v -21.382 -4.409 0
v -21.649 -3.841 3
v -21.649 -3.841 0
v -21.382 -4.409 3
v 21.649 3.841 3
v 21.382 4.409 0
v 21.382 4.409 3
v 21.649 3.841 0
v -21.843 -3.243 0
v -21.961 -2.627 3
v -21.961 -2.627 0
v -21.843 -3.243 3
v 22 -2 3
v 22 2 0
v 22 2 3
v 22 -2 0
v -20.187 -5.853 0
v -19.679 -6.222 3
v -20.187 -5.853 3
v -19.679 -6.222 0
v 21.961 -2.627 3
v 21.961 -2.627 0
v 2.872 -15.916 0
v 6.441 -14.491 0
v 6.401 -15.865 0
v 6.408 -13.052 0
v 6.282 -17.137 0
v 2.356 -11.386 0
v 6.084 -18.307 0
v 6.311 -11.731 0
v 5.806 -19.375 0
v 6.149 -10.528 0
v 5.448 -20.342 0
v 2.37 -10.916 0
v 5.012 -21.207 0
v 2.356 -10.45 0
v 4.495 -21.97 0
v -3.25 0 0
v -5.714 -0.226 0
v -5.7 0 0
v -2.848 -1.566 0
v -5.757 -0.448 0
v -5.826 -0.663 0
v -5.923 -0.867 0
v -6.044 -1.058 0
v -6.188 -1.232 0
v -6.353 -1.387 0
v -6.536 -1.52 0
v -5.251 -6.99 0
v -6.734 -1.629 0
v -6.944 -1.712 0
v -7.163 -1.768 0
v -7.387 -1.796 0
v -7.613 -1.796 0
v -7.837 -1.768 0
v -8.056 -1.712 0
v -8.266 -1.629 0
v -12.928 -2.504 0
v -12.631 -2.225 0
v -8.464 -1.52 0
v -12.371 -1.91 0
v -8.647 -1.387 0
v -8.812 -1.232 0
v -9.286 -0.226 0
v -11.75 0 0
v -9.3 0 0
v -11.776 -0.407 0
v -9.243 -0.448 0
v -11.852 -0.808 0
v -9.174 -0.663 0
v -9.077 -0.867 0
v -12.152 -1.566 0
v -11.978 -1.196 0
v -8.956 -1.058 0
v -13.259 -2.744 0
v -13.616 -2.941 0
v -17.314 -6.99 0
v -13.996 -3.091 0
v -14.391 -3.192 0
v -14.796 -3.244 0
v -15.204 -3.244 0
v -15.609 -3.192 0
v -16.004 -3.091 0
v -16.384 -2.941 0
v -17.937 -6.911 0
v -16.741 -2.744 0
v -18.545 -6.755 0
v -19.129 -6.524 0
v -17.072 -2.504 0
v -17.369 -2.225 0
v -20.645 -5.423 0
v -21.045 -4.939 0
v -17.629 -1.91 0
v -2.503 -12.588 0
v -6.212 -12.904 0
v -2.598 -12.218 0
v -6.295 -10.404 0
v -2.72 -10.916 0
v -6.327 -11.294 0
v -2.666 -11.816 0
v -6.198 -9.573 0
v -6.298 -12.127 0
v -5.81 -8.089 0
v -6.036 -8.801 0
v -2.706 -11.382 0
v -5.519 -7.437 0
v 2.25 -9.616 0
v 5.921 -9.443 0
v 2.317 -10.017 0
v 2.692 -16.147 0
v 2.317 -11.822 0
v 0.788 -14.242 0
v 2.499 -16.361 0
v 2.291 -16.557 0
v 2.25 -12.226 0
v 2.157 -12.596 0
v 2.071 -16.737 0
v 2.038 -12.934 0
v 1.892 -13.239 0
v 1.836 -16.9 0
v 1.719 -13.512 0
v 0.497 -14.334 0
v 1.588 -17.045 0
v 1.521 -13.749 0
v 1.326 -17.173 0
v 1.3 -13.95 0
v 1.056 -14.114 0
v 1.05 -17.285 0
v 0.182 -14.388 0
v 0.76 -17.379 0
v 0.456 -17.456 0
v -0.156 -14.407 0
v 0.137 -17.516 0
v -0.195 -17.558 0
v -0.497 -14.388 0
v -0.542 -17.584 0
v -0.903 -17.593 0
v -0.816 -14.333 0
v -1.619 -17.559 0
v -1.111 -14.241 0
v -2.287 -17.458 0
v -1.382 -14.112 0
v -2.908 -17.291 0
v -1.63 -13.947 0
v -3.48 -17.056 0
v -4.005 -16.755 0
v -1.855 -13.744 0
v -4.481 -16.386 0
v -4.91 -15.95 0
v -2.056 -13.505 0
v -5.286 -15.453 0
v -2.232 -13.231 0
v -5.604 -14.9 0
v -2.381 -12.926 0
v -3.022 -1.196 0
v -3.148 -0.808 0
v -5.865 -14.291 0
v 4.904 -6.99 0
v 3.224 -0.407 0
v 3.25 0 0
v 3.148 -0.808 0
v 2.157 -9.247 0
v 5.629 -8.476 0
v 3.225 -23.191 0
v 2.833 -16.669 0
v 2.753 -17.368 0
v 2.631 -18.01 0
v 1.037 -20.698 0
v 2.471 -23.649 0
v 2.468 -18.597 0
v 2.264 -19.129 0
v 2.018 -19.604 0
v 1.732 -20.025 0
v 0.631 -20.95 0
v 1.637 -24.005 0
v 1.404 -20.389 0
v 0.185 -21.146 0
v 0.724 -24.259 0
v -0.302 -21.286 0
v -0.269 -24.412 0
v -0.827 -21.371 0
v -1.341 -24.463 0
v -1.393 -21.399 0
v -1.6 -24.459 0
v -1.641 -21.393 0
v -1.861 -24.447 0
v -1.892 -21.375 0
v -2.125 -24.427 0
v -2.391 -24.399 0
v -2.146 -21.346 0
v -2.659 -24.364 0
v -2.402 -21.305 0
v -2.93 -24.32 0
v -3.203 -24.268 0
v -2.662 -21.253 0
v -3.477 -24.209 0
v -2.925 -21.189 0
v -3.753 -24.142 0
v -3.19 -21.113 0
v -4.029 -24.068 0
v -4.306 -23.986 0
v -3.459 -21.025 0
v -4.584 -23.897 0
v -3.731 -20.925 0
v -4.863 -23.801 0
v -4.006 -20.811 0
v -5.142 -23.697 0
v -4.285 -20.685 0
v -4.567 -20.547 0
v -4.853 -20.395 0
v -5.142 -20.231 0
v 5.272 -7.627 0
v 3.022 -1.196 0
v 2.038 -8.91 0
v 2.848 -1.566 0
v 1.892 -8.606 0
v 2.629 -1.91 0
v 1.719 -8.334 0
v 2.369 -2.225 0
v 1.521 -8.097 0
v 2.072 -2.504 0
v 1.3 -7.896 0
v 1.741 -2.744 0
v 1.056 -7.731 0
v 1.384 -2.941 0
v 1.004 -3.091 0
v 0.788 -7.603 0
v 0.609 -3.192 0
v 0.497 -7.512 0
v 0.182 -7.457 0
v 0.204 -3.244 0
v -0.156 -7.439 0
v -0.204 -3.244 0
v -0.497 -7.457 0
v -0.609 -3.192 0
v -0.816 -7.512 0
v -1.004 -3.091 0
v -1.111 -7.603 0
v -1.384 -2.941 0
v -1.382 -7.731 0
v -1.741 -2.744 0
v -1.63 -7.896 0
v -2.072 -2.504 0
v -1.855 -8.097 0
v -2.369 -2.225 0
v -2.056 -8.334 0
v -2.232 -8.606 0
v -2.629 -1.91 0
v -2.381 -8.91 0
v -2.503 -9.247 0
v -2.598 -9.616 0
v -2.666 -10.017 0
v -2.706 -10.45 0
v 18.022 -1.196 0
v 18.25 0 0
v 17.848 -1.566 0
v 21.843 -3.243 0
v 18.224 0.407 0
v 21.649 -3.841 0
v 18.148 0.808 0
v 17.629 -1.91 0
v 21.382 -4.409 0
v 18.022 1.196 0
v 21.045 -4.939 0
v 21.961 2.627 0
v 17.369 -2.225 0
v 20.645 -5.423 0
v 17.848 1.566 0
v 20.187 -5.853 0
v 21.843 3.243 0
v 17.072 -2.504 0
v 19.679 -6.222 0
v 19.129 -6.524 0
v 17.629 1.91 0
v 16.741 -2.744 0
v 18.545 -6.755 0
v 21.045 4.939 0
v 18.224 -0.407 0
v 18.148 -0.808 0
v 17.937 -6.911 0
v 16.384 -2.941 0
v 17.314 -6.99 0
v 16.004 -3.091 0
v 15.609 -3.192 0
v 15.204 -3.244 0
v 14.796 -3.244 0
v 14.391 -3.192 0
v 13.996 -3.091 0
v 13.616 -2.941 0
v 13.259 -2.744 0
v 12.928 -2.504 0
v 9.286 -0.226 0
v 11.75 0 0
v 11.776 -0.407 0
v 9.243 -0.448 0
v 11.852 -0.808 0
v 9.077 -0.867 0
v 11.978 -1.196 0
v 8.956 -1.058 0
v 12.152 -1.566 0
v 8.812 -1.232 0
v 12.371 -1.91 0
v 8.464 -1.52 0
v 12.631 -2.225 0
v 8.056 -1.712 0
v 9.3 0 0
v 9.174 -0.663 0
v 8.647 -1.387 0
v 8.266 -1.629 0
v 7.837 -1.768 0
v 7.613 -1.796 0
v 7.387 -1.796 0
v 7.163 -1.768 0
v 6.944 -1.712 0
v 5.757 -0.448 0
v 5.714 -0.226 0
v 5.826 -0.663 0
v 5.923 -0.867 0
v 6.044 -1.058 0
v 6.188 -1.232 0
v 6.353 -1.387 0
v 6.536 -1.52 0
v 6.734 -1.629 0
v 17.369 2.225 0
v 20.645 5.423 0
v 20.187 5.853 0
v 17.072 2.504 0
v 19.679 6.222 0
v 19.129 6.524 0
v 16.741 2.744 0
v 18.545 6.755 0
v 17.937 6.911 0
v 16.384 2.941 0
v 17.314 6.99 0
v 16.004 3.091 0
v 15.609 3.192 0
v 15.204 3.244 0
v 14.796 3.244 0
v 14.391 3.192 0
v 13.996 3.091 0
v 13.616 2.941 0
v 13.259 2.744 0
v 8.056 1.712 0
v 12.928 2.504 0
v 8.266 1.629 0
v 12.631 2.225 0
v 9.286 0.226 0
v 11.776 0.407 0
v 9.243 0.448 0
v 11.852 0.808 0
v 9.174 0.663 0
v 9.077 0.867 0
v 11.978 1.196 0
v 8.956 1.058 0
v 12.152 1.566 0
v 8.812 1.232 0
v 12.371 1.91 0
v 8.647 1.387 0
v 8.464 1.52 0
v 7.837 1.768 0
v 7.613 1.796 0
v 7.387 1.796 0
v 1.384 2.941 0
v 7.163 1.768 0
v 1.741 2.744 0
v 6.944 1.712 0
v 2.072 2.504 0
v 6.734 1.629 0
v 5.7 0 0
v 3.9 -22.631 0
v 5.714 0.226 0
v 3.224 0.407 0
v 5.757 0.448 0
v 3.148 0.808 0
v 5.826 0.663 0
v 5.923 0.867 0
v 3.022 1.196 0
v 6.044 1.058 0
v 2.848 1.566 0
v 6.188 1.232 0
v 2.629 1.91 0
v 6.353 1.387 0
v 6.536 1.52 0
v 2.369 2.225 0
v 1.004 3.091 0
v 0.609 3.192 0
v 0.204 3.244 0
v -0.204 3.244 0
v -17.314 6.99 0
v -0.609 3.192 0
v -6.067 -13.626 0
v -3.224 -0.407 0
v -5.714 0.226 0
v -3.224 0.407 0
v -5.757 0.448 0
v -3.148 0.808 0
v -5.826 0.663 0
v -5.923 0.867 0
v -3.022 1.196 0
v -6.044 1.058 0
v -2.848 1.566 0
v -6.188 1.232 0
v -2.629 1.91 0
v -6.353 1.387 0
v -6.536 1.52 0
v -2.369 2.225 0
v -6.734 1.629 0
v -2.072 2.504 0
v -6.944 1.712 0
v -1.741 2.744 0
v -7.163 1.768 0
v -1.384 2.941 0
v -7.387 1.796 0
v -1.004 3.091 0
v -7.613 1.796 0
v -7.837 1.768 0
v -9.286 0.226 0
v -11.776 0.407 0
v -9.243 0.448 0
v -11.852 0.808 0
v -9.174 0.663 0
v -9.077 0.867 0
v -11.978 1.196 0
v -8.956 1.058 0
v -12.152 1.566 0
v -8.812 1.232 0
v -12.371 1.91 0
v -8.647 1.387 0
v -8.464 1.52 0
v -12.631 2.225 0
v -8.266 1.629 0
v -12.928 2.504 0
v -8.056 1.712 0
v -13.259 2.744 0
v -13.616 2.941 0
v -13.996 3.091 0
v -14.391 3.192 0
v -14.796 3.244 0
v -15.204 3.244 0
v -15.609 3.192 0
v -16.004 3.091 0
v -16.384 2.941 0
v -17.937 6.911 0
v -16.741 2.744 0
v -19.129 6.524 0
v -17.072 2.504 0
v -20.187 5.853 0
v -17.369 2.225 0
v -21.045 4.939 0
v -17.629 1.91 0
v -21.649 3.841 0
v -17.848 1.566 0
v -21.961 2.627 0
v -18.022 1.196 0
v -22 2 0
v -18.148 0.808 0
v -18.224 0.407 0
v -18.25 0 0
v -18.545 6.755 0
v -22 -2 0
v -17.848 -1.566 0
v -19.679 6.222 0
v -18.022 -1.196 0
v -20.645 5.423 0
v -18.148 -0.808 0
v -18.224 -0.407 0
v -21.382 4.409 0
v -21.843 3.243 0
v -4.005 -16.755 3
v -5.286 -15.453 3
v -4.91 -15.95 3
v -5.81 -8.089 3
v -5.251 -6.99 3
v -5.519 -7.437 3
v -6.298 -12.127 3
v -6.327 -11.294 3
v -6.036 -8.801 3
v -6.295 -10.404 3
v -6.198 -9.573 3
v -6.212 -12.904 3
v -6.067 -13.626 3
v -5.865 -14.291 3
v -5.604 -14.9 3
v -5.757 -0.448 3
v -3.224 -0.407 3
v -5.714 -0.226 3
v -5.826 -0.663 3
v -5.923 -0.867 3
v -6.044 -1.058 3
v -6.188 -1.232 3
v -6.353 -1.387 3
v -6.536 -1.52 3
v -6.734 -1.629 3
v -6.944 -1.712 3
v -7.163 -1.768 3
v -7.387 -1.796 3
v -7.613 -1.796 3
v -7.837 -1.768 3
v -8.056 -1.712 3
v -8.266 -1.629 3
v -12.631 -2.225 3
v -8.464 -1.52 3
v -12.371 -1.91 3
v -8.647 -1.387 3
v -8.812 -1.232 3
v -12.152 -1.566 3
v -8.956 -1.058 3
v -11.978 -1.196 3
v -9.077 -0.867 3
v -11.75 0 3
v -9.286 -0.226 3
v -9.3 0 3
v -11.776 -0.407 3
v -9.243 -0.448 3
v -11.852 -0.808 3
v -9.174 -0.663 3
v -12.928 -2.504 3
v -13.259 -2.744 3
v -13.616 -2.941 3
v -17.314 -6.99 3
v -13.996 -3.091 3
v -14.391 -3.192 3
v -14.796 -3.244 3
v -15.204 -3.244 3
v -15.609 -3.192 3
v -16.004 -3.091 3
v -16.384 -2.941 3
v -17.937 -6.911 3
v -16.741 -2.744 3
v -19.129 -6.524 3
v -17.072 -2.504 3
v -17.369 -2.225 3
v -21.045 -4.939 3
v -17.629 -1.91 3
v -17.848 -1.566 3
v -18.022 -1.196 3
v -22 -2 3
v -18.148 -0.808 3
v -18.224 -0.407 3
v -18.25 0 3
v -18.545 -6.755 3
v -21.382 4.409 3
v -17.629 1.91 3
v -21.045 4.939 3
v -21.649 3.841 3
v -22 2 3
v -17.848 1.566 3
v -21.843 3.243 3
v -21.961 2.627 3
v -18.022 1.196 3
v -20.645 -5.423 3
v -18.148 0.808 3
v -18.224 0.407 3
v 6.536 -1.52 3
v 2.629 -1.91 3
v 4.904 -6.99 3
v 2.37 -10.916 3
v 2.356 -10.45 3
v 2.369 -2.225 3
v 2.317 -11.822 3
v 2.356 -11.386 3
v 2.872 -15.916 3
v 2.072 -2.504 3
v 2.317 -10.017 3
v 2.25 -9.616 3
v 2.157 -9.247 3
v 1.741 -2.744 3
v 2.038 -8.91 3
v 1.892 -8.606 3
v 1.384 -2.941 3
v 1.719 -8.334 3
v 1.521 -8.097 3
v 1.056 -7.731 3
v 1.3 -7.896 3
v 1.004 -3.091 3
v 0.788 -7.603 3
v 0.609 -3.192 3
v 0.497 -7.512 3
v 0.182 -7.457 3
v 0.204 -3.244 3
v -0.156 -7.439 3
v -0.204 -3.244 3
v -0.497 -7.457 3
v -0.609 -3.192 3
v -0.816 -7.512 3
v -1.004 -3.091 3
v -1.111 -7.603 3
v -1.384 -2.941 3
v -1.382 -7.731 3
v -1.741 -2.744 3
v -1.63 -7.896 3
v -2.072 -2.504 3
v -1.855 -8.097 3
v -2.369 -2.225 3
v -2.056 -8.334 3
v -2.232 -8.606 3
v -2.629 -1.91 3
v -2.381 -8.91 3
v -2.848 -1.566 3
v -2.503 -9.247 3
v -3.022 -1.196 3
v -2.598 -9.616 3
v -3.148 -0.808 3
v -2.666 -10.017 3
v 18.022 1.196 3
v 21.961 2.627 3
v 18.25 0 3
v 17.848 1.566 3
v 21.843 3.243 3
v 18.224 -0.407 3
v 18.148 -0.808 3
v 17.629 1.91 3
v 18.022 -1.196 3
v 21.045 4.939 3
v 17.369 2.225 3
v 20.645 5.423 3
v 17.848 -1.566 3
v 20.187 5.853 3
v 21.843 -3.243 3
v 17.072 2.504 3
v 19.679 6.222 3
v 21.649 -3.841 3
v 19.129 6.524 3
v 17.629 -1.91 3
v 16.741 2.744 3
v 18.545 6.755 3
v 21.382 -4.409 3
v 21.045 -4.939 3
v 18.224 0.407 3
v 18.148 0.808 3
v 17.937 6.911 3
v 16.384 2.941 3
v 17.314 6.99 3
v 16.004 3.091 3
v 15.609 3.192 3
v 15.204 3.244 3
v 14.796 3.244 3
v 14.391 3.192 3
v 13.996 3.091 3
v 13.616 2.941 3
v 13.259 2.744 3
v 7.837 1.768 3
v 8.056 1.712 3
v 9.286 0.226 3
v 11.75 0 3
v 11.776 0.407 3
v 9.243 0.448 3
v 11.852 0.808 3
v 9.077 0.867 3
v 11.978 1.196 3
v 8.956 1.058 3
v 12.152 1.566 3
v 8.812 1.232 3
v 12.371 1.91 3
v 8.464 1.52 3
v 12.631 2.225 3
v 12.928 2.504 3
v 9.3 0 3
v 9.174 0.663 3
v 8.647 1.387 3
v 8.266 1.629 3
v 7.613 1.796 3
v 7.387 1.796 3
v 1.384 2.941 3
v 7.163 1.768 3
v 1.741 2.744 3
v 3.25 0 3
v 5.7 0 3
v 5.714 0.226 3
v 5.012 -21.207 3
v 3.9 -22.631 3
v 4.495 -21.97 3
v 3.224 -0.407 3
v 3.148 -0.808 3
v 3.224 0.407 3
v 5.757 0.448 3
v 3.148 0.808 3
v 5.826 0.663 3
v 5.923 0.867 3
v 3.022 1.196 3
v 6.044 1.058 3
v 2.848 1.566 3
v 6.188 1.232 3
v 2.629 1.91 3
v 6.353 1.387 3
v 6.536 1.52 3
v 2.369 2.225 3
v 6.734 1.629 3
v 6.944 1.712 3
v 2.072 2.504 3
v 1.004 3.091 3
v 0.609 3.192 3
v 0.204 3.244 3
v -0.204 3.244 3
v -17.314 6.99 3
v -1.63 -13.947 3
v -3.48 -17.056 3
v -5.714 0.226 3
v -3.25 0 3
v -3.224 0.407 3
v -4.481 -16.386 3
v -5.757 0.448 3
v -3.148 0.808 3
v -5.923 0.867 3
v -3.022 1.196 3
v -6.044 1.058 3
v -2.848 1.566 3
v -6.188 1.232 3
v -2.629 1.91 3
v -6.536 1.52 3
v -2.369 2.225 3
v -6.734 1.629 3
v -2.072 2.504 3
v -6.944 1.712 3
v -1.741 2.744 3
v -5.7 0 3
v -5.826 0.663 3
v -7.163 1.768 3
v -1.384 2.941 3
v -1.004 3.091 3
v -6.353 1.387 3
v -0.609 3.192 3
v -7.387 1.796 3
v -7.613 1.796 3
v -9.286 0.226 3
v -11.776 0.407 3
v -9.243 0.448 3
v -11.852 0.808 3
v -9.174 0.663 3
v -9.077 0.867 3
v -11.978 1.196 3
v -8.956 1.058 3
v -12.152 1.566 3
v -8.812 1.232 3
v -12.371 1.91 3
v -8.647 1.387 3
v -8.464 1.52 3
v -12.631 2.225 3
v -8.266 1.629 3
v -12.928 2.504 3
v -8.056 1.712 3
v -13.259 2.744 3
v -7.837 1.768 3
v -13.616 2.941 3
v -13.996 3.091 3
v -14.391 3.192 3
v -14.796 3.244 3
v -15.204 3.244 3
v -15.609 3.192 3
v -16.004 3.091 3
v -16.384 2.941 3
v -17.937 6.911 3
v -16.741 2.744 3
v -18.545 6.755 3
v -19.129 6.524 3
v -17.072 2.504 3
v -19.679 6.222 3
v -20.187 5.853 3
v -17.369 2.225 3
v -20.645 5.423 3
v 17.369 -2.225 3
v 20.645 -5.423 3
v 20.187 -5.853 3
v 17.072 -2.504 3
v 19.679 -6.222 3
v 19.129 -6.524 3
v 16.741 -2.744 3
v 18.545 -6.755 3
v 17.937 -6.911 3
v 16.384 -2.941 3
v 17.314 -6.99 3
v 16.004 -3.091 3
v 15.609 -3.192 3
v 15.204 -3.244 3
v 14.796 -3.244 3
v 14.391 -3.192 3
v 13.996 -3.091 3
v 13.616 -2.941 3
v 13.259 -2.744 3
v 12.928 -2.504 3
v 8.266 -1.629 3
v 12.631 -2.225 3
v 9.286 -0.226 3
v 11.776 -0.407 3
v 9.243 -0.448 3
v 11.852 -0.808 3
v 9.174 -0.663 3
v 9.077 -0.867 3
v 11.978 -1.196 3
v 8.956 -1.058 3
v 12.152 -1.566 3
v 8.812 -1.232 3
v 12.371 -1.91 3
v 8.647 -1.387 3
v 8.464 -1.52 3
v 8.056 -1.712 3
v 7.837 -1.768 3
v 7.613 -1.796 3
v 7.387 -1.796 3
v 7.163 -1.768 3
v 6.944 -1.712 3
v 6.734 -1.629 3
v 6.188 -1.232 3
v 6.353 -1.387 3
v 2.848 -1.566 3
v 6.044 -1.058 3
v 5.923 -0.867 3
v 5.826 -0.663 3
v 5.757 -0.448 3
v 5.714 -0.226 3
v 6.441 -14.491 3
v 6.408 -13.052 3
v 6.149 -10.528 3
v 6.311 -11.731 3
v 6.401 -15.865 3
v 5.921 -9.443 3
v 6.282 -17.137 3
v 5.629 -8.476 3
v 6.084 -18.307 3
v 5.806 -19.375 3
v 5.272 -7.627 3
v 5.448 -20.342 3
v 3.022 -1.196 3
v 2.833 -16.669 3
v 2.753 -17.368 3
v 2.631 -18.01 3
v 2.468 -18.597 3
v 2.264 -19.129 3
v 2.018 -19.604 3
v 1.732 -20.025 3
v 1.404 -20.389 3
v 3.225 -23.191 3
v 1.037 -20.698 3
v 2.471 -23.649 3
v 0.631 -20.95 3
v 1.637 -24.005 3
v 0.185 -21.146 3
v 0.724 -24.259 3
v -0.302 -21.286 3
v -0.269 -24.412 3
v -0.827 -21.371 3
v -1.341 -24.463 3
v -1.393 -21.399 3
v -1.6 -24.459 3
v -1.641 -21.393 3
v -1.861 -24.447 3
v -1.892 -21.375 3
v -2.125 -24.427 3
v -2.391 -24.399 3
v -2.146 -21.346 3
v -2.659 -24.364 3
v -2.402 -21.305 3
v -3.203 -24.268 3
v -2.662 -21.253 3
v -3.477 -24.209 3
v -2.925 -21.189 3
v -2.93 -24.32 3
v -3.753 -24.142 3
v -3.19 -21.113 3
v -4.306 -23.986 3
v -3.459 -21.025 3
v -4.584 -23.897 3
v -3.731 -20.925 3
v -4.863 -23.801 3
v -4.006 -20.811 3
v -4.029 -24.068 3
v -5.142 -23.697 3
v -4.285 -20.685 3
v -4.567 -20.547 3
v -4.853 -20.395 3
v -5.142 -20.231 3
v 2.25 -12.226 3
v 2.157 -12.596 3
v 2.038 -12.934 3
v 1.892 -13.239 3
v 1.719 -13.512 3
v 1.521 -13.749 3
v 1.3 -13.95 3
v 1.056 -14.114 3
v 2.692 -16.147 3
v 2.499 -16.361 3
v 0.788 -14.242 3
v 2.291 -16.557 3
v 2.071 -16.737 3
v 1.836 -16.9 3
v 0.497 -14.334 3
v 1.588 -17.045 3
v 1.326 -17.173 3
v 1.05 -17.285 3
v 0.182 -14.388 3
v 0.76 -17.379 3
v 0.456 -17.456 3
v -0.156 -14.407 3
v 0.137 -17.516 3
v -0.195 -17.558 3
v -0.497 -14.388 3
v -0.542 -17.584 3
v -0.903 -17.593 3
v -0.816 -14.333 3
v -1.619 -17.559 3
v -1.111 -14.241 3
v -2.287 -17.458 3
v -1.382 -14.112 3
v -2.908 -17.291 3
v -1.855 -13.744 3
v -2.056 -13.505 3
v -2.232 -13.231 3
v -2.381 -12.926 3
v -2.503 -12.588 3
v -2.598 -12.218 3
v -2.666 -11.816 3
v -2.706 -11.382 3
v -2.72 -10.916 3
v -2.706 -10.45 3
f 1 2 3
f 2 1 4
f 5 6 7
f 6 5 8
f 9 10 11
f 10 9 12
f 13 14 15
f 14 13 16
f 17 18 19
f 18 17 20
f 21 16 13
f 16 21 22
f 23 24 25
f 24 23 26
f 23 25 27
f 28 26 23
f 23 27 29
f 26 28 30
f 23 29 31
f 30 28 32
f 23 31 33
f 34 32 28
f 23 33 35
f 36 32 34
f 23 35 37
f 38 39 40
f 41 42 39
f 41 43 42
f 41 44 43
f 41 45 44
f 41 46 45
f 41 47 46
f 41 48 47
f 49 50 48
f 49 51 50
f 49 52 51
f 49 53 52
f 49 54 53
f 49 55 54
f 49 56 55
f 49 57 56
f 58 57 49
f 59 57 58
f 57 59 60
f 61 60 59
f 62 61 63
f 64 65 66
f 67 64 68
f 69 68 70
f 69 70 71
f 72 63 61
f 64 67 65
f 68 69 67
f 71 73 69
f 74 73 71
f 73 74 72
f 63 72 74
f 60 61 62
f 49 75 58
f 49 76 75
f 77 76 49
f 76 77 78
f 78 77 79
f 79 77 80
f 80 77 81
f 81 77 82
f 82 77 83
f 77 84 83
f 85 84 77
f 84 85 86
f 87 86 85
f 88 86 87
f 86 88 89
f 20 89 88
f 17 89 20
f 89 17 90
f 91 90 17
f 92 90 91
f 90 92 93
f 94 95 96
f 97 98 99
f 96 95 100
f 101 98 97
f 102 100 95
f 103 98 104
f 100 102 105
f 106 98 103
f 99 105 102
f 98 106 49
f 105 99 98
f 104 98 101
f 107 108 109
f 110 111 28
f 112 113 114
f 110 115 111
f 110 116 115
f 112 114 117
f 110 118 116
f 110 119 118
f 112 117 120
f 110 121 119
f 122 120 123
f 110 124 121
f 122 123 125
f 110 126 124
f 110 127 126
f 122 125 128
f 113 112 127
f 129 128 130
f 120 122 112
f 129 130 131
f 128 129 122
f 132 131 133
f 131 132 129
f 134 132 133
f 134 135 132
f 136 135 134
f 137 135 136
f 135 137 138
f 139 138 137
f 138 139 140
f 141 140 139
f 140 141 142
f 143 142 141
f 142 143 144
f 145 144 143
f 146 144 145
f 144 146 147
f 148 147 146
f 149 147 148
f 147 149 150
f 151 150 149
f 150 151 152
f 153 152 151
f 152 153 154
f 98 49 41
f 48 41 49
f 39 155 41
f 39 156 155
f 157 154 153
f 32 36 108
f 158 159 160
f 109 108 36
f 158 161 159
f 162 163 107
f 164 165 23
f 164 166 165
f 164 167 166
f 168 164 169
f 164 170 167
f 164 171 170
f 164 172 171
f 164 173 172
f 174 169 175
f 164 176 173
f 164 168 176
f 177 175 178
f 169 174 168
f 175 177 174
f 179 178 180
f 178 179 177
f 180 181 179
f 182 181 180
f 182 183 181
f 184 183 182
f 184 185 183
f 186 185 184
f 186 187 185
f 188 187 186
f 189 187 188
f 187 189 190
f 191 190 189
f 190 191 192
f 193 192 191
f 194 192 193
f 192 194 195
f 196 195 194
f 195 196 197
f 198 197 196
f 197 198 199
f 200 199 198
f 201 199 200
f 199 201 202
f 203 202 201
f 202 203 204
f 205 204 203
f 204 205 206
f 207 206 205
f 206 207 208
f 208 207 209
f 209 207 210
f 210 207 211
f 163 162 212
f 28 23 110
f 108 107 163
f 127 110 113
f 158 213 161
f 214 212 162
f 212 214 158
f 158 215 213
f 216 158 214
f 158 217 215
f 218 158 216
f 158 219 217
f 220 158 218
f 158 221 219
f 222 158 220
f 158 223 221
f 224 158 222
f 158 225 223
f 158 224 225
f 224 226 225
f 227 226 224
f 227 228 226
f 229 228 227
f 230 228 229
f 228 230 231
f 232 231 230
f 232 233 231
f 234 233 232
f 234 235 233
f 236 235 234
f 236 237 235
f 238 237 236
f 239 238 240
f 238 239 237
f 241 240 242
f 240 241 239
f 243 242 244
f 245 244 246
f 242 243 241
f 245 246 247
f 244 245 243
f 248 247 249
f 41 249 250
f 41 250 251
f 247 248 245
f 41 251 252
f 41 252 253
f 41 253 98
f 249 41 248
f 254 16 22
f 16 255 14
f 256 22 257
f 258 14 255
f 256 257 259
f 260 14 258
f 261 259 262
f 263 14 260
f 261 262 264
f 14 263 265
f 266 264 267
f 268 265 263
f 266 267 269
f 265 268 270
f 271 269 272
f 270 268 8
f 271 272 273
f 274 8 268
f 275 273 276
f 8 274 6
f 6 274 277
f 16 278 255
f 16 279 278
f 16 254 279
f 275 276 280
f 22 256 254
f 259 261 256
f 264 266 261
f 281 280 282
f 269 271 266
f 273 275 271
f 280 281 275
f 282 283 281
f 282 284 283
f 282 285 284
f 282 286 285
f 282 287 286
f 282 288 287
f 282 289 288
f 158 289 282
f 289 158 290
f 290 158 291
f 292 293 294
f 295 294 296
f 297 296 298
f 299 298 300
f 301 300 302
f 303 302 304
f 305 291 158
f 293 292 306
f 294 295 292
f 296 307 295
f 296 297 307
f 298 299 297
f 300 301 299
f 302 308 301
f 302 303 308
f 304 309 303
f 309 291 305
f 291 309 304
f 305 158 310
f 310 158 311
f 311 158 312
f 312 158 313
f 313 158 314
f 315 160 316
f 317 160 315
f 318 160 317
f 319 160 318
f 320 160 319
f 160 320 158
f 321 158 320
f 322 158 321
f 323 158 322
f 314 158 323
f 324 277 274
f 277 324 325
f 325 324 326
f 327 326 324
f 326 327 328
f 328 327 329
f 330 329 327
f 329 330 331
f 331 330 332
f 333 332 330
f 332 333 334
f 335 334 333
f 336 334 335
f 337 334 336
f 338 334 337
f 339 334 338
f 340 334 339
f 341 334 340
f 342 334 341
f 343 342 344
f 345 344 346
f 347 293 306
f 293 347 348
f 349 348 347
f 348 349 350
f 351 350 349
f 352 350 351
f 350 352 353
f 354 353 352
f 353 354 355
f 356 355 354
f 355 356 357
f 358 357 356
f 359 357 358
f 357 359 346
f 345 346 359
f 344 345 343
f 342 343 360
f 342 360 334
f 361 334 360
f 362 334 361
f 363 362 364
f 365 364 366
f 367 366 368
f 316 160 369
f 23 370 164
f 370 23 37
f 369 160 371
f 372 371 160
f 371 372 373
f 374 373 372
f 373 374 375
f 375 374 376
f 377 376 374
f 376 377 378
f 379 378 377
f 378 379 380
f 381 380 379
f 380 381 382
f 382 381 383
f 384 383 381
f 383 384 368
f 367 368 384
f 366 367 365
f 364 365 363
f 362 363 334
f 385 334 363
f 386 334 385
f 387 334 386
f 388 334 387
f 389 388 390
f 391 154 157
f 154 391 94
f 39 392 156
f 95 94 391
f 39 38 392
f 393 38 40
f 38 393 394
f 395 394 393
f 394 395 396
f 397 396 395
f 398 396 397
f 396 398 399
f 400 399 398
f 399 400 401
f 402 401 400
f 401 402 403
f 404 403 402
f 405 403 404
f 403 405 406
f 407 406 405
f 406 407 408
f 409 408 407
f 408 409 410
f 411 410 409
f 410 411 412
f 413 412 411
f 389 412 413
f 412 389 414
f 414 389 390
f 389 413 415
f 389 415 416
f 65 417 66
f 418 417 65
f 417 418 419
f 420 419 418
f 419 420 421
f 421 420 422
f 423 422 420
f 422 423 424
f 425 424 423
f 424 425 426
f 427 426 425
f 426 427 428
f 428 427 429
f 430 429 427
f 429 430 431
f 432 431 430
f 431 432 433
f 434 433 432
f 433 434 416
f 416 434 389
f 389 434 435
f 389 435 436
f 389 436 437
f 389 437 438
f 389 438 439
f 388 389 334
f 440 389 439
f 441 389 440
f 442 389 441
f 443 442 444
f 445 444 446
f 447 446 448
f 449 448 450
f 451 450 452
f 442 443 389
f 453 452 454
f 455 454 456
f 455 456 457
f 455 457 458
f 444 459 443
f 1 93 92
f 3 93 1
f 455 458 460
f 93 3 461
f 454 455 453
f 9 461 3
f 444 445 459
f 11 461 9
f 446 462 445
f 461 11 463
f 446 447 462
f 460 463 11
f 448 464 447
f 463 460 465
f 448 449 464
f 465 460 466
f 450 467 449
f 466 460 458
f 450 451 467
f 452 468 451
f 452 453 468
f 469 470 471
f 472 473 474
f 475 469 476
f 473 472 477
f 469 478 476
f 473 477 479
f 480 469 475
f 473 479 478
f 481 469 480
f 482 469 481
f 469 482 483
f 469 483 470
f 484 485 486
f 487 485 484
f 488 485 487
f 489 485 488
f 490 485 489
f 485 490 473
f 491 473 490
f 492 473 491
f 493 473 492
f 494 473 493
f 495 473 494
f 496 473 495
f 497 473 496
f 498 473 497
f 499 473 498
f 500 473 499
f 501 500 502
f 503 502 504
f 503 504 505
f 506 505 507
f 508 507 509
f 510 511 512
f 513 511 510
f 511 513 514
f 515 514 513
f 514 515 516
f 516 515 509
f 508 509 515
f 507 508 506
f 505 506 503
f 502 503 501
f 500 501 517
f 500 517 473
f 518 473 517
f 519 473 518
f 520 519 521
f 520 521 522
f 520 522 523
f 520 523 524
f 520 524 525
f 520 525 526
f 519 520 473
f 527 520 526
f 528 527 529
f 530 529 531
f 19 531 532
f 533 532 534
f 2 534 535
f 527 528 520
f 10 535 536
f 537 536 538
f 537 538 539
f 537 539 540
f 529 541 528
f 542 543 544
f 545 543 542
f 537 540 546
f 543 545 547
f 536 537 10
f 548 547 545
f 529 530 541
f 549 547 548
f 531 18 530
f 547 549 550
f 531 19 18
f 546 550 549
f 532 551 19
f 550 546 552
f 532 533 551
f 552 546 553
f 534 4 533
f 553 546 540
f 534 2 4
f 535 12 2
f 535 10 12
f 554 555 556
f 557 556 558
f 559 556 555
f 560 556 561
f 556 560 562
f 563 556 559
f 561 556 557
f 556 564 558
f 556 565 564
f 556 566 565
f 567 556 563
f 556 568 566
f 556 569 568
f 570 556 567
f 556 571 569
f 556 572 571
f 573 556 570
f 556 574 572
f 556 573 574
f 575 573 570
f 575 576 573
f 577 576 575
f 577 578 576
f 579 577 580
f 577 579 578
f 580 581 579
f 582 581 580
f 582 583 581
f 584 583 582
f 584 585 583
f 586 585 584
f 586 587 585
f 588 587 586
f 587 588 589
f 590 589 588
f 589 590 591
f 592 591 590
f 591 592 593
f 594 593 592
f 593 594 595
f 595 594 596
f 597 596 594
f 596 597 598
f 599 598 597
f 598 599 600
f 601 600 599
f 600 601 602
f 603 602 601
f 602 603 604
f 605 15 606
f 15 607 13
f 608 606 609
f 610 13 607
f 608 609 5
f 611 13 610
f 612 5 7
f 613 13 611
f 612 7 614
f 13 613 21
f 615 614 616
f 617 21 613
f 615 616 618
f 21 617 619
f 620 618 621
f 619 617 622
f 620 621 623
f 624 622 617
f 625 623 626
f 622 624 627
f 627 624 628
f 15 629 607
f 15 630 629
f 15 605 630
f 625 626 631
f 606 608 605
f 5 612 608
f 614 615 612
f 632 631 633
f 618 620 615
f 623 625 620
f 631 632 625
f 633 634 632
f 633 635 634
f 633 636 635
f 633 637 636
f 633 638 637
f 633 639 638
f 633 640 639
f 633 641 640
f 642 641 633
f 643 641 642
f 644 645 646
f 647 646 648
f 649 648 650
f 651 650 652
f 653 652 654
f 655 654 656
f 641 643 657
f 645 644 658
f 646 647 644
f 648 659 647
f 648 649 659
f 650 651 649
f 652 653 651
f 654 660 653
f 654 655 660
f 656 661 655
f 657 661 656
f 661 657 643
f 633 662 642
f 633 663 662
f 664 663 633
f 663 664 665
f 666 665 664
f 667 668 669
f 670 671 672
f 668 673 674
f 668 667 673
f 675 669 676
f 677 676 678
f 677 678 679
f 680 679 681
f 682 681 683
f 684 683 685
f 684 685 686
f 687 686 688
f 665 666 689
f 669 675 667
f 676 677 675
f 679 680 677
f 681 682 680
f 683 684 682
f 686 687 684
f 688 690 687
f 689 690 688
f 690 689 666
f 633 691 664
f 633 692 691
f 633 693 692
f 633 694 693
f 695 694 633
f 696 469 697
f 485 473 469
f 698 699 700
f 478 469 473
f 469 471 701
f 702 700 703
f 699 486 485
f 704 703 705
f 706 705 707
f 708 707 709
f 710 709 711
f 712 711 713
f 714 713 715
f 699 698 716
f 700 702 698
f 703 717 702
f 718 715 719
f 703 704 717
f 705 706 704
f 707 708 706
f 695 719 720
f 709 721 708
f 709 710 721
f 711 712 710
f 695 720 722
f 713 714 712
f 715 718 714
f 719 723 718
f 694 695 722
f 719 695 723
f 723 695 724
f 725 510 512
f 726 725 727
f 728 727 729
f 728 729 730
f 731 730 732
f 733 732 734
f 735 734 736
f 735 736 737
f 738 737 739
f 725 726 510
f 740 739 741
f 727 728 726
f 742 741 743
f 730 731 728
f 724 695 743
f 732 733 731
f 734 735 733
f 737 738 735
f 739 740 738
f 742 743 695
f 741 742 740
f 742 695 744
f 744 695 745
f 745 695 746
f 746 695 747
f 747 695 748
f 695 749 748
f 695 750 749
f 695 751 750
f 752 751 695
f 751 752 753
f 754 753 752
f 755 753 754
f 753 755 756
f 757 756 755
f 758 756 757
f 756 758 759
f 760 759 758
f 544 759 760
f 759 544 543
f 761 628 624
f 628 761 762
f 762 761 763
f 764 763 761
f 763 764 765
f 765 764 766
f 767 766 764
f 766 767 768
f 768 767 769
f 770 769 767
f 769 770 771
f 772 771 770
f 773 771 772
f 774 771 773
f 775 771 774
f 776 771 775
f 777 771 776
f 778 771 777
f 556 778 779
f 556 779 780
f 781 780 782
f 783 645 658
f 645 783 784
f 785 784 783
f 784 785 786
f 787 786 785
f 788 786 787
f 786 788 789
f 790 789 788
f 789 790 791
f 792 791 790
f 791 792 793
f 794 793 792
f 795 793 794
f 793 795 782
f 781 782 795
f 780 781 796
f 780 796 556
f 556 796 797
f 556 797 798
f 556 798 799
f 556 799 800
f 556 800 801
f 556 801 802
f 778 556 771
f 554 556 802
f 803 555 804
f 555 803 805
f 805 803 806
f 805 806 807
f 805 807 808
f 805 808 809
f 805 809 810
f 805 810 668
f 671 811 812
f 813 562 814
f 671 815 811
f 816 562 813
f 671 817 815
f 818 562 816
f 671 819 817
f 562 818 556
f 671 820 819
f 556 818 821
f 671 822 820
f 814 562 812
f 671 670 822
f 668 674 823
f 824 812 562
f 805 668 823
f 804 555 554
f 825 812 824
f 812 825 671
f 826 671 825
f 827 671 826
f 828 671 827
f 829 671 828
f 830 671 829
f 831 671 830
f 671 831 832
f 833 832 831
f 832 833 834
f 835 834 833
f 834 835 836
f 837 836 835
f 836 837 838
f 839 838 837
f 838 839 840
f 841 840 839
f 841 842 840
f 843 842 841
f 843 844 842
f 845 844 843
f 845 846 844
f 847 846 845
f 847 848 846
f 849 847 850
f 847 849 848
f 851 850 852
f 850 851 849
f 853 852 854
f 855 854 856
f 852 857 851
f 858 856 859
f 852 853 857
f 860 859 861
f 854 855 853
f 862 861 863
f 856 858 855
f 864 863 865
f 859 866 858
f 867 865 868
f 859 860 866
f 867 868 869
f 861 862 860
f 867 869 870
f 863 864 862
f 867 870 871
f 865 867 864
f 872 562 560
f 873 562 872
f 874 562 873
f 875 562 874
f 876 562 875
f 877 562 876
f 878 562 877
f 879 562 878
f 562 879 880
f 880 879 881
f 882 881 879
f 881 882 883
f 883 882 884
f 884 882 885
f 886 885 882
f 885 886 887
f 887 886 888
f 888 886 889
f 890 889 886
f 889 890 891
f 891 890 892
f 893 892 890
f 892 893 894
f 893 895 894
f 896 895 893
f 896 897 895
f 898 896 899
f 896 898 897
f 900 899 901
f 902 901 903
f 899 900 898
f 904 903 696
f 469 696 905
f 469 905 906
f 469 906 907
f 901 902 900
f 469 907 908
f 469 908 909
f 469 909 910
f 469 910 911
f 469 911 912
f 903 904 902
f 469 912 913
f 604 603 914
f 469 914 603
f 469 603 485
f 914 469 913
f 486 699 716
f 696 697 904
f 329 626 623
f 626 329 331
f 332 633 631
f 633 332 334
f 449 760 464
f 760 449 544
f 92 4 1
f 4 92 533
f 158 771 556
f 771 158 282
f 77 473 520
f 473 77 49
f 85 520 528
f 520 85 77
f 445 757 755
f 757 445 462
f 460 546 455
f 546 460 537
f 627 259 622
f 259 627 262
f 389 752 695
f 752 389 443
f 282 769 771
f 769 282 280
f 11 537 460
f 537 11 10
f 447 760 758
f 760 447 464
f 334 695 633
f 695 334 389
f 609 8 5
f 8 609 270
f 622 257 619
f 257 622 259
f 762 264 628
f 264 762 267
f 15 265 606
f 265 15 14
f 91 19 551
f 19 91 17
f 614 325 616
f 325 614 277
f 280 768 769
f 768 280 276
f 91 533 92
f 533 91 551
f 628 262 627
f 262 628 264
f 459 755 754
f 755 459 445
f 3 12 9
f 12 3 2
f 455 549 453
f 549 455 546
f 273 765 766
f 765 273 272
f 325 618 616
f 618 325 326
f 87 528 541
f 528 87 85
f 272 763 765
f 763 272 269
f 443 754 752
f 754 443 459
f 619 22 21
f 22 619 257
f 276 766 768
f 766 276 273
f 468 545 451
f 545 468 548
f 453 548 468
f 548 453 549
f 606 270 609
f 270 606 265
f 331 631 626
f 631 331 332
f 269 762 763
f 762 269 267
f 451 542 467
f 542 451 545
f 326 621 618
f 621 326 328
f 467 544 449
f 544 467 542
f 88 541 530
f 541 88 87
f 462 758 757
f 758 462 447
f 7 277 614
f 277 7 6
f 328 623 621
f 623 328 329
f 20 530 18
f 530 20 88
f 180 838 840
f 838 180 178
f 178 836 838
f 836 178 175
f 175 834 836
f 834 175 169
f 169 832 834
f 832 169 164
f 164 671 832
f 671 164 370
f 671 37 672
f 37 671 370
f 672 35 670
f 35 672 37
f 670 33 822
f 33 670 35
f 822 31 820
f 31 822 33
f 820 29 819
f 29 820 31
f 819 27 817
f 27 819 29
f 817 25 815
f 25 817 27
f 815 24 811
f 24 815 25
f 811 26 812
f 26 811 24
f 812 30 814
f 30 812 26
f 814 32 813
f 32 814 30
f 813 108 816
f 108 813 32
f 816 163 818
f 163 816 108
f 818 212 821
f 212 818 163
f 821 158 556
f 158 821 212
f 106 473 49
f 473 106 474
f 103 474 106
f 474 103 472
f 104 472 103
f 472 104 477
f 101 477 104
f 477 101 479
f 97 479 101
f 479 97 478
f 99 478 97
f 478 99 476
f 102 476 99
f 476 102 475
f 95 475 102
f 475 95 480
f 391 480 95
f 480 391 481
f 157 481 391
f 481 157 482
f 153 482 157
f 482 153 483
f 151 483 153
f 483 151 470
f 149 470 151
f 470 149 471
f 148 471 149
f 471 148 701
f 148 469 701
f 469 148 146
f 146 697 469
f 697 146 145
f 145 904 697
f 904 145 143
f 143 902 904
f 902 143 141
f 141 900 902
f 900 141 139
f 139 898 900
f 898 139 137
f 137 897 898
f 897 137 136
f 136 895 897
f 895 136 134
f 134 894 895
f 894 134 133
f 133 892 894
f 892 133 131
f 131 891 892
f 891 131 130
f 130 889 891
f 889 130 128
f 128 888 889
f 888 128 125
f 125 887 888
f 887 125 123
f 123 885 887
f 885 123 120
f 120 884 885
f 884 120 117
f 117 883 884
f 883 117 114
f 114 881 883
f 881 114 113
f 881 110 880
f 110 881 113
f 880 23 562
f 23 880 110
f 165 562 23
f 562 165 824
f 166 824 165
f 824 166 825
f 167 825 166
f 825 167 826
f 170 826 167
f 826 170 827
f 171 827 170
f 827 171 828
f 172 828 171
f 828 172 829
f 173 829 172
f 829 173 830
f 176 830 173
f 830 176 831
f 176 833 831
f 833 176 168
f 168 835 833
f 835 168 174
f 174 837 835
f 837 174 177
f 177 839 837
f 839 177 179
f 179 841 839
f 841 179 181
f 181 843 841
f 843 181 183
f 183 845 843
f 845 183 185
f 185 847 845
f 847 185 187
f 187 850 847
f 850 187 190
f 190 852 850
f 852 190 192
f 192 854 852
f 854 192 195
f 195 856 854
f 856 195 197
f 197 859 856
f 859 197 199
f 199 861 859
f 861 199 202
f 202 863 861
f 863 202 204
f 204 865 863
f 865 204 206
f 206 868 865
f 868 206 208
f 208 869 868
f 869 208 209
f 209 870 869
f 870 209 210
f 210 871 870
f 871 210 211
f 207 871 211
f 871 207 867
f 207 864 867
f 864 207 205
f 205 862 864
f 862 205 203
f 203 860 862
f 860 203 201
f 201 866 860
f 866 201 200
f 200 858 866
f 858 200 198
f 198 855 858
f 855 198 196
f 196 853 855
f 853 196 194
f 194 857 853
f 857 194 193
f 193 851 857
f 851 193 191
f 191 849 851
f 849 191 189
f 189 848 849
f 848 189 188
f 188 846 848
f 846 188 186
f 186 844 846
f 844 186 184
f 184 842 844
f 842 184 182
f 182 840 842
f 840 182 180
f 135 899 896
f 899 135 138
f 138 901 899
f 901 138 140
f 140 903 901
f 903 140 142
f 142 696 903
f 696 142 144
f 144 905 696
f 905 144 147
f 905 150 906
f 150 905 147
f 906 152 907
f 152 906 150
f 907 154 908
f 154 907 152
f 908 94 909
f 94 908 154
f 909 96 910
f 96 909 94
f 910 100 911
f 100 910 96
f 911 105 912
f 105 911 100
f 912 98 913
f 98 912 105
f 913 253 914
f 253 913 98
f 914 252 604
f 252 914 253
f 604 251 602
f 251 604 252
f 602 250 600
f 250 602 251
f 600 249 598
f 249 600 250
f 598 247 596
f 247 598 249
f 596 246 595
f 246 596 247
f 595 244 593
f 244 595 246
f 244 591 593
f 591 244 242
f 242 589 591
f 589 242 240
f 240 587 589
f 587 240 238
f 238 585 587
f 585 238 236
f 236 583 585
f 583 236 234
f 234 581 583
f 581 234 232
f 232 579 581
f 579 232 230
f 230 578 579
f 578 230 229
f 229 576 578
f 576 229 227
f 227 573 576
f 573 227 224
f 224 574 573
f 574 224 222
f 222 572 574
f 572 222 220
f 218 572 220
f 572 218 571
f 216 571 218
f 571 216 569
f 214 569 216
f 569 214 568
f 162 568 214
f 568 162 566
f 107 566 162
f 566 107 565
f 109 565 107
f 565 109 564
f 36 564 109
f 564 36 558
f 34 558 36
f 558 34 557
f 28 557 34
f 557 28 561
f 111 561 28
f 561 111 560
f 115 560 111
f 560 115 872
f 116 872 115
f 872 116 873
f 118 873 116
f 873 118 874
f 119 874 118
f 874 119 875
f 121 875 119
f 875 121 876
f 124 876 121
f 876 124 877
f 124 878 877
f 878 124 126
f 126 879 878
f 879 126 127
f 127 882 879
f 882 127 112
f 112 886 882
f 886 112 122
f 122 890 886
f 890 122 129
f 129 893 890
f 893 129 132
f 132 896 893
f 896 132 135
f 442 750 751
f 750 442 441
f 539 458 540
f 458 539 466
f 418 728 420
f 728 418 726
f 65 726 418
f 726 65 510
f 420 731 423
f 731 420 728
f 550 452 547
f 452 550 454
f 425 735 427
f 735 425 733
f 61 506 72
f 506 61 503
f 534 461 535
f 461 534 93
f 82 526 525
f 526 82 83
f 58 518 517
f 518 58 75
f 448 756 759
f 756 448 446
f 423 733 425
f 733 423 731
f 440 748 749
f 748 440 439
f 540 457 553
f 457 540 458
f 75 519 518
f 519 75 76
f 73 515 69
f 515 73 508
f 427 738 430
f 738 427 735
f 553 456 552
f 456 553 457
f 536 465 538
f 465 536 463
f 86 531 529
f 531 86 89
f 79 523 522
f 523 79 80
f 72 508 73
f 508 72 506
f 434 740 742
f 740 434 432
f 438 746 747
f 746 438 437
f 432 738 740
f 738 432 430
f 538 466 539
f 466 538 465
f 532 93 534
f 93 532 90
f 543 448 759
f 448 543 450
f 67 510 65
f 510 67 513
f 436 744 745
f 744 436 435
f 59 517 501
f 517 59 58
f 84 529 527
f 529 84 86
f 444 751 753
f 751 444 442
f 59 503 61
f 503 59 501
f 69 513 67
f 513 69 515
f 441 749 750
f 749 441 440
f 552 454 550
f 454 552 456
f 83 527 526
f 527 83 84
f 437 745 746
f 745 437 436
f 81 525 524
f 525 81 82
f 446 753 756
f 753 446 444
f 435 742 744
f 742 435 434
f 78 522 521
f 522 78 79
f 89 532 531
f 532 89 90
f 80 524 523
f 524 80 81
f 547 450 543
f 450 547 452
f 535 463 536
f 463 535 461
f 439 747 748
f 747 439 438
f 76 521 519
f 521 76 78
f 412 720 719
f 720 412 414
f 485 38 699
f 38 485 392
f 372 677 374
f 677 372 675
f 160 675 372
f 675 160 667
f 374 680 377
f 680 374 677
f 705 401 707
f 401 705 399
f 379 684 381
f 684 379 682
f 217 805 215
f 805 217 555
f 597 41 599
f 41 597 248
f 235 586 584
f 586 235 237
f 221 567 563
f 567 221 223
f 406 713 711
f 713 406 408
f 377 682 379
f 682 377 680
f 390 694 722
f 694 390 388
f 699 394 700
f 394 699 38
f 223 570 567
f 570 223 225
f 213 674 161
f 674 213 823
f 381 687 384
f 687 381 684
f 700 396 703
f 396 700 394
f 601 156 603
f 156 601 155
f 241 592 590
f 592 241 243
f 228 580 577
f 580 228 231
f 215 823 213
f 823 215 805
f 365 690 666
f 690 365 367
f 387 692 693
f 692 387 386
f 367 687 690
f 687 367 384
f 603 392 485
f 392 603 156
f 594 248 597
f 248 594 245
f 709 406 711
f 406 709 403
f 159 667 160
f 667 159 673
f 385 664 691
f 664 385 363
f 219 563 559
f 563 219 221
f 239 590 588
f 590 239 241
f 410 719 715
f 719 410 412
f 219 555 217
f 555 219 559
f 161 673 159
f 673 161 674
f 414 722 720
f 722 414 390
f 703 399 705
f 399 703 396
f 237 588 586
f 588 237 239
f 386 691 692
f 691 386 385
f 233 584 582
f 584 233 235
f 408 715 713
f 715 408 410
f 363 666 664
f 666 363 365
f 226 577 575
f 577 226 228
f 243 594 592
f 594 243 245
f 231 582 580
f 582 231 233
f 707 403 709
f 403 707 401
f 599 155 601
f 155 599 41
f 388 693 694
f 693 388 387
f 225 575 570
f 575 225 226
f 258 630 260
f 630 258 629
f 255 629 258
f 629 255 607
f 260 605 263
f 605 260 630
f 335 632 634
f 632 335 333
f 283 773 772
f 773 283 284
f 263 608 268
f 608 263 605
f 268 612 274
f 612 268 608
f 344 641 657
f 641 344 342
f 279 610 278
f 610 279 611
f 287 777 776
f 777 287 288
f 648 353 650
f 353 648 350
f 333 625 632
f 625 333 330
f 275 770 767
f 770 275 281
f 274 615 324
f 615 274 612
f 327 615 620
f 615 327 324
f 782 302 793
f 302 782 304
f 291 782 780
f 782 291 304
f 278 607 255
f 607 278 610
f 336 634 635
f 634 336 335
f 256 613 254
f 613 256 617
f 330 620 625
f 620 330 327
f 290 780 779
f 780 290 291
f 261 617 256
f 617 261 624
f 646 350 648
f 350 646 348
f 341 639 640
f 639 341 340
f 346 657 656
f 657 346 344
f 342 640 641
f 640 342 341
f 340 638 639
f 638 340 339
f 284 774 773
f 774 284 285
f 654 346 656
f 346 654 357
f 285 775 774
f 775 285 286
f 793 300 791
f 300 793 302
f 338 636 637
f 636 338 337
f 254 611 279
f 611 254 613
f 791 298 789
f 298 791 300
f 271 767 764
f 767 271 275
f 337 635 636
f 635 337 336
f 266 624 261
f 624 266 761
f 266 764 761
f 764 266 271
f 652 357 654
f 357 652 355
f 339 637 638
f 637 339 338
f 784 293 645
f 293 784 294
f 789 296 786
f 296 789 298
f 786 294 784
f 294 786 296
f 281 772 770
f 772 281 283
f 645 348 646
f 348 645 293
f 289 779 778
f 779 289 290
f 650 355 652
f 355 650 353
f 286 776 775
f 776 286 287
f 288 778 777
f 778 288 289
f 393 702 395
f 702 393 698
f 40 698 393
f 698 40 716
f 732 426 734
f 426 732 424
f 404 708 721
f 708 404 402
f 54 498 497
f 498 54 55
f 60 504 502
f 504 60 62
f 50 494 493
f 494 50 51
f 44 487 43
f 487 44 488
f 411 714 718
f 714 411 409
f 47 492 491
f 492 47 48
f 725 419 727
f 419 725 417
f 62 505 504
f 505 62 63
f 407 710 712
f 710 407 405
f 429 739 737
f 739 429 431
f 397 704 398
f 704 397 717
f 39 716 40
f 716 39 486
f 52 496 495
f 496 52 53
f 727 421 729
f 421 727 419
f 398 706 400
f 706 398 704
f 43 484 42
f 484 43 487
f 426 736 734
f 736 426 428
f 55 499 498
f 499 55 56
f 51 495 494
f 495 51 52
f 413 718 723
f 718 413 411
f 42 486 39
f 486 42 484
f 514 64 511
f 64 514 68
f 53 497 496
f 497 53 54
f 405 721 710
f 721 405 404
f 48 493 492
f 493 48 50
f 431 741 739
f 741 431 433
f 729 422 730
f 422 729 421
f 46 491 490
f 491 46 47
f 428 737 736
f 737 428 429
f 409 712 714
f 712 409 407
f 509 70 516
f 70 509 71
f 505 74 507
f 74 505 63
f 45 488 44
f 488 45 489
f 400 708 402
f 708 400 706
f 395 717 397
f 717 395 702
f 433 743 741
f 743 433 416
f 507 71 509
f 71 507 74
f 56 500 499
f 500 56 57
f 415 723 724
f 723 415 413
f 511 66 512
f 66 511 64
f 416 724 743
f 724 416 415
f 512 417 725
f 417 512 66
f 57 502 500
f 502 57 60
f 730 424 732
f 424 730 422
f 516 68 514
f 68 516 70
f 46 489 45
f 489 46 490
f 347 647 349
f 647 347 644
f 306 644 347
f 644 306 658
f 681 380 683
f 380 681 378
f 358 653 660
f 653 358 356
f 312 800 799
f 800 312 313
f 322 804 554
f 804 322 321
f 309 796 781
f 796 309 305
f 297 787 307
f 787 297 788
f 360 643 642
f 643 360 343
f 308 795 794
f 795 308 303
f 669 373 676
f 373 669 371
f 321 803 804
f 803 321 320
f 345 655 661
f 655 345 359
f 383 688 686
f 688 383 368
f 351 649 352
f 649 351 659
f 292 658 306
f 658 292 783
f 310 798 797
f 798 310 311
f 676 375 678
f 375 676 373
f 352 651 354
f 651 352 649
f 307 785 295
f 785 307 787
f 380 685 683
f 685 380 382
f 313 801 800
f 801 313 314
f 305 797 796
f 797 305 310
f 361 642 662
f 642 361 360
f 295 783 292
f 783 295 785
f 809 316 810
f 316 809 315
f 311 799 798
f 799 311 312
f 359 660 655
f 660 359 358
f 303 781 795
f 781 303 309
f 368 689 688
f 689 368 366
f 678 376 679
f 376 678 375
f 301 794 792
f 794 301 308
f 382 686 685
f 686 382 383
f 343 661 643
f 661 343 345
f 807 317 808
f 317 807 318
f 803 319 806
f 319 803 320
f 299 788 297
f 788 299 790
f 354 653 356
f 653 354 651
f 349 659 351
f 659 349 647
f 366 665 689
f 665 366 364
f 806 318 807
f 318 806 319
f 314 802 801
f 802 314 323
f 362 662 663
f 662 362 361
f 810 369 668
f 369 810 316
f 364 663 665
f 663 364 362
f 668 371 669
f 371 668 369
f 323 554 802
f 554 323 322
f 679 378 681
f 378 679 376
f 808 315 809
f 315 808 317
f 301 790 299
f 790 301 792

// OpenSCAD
$fn = 50;


difference() {
	union() {
		hull() {
			translate(v = [-17.0000000000, 2.0000000000, 0]) {
				cylinder(h = 3, r = 5);
			}
			translate(v = [17.0000000000, 2.0000000000, 0]) {
				cylinder(h = 3, r = 5);
			}
			translate(v = [-17.0000000000, -2.0000000000, 0]) {
				cylinder(h = 3, r = 5);
			}
			translate(v = [17.0000000000, -2.0000000000, 0]) {
				cylinder(h = 3, r = 5);
			}
		}
		translate(v = [0, -5, 0]) {
			linear_extrude(height = 3) {
				text(font = "DejaVu Sans Mono:style=Bold", halign = "center", size = 19.0000000000, text = "9", valign = "top");
			}
		}
	}
	union() {
		translate(v = [-15.0000000000, 0.0000000000, 0]) {
			translate(v = [0, 0, -100]) {
				cylinder(h = 200, r = 3.2500000000);
			}
		}
		translate(v = [0, 0, -100]) {
			cylinder(h = 200, r = 3.2500000000);
		}
		translate(v = [15.0000000000, 0.0000000000, 0]) {
			translate(v = [0, 0, -100]) {
				cylinder(h = 200, r = 3.2500000000);
			}
		}
		translate(v = [-15.0000000000, 0.0000000000, 0]) {
			translate(v = [0, 0, -100]) {
				cylinder(h = 200, r = 1.8000000000);
			}
		}
		translate(v = [-7.5000000000, 0.0000000000, 0]) {
			translate(v = [0, 0, -100]) {
				cylinder(h = 200, r = 1.8000000000);
			}
		}
		translate(v = [0, 0, -100]) {
			cylinder(h = 200, r = 1.8000000000);
		}
		translate(v = [7.5000000000, 0.0000000000, 0]) {
			translate(v = [0, 0, -100]) {
				cylinder(h = 200, r = 1.8000000000);
			}
		}
		translate(v = [15.0000000000, 0.0000000000, 0]) {
			translate(v = [0, 0, -100]) {
				cylinder(h = 200, r = 1.8000000000);
			}
		}
	}
}
